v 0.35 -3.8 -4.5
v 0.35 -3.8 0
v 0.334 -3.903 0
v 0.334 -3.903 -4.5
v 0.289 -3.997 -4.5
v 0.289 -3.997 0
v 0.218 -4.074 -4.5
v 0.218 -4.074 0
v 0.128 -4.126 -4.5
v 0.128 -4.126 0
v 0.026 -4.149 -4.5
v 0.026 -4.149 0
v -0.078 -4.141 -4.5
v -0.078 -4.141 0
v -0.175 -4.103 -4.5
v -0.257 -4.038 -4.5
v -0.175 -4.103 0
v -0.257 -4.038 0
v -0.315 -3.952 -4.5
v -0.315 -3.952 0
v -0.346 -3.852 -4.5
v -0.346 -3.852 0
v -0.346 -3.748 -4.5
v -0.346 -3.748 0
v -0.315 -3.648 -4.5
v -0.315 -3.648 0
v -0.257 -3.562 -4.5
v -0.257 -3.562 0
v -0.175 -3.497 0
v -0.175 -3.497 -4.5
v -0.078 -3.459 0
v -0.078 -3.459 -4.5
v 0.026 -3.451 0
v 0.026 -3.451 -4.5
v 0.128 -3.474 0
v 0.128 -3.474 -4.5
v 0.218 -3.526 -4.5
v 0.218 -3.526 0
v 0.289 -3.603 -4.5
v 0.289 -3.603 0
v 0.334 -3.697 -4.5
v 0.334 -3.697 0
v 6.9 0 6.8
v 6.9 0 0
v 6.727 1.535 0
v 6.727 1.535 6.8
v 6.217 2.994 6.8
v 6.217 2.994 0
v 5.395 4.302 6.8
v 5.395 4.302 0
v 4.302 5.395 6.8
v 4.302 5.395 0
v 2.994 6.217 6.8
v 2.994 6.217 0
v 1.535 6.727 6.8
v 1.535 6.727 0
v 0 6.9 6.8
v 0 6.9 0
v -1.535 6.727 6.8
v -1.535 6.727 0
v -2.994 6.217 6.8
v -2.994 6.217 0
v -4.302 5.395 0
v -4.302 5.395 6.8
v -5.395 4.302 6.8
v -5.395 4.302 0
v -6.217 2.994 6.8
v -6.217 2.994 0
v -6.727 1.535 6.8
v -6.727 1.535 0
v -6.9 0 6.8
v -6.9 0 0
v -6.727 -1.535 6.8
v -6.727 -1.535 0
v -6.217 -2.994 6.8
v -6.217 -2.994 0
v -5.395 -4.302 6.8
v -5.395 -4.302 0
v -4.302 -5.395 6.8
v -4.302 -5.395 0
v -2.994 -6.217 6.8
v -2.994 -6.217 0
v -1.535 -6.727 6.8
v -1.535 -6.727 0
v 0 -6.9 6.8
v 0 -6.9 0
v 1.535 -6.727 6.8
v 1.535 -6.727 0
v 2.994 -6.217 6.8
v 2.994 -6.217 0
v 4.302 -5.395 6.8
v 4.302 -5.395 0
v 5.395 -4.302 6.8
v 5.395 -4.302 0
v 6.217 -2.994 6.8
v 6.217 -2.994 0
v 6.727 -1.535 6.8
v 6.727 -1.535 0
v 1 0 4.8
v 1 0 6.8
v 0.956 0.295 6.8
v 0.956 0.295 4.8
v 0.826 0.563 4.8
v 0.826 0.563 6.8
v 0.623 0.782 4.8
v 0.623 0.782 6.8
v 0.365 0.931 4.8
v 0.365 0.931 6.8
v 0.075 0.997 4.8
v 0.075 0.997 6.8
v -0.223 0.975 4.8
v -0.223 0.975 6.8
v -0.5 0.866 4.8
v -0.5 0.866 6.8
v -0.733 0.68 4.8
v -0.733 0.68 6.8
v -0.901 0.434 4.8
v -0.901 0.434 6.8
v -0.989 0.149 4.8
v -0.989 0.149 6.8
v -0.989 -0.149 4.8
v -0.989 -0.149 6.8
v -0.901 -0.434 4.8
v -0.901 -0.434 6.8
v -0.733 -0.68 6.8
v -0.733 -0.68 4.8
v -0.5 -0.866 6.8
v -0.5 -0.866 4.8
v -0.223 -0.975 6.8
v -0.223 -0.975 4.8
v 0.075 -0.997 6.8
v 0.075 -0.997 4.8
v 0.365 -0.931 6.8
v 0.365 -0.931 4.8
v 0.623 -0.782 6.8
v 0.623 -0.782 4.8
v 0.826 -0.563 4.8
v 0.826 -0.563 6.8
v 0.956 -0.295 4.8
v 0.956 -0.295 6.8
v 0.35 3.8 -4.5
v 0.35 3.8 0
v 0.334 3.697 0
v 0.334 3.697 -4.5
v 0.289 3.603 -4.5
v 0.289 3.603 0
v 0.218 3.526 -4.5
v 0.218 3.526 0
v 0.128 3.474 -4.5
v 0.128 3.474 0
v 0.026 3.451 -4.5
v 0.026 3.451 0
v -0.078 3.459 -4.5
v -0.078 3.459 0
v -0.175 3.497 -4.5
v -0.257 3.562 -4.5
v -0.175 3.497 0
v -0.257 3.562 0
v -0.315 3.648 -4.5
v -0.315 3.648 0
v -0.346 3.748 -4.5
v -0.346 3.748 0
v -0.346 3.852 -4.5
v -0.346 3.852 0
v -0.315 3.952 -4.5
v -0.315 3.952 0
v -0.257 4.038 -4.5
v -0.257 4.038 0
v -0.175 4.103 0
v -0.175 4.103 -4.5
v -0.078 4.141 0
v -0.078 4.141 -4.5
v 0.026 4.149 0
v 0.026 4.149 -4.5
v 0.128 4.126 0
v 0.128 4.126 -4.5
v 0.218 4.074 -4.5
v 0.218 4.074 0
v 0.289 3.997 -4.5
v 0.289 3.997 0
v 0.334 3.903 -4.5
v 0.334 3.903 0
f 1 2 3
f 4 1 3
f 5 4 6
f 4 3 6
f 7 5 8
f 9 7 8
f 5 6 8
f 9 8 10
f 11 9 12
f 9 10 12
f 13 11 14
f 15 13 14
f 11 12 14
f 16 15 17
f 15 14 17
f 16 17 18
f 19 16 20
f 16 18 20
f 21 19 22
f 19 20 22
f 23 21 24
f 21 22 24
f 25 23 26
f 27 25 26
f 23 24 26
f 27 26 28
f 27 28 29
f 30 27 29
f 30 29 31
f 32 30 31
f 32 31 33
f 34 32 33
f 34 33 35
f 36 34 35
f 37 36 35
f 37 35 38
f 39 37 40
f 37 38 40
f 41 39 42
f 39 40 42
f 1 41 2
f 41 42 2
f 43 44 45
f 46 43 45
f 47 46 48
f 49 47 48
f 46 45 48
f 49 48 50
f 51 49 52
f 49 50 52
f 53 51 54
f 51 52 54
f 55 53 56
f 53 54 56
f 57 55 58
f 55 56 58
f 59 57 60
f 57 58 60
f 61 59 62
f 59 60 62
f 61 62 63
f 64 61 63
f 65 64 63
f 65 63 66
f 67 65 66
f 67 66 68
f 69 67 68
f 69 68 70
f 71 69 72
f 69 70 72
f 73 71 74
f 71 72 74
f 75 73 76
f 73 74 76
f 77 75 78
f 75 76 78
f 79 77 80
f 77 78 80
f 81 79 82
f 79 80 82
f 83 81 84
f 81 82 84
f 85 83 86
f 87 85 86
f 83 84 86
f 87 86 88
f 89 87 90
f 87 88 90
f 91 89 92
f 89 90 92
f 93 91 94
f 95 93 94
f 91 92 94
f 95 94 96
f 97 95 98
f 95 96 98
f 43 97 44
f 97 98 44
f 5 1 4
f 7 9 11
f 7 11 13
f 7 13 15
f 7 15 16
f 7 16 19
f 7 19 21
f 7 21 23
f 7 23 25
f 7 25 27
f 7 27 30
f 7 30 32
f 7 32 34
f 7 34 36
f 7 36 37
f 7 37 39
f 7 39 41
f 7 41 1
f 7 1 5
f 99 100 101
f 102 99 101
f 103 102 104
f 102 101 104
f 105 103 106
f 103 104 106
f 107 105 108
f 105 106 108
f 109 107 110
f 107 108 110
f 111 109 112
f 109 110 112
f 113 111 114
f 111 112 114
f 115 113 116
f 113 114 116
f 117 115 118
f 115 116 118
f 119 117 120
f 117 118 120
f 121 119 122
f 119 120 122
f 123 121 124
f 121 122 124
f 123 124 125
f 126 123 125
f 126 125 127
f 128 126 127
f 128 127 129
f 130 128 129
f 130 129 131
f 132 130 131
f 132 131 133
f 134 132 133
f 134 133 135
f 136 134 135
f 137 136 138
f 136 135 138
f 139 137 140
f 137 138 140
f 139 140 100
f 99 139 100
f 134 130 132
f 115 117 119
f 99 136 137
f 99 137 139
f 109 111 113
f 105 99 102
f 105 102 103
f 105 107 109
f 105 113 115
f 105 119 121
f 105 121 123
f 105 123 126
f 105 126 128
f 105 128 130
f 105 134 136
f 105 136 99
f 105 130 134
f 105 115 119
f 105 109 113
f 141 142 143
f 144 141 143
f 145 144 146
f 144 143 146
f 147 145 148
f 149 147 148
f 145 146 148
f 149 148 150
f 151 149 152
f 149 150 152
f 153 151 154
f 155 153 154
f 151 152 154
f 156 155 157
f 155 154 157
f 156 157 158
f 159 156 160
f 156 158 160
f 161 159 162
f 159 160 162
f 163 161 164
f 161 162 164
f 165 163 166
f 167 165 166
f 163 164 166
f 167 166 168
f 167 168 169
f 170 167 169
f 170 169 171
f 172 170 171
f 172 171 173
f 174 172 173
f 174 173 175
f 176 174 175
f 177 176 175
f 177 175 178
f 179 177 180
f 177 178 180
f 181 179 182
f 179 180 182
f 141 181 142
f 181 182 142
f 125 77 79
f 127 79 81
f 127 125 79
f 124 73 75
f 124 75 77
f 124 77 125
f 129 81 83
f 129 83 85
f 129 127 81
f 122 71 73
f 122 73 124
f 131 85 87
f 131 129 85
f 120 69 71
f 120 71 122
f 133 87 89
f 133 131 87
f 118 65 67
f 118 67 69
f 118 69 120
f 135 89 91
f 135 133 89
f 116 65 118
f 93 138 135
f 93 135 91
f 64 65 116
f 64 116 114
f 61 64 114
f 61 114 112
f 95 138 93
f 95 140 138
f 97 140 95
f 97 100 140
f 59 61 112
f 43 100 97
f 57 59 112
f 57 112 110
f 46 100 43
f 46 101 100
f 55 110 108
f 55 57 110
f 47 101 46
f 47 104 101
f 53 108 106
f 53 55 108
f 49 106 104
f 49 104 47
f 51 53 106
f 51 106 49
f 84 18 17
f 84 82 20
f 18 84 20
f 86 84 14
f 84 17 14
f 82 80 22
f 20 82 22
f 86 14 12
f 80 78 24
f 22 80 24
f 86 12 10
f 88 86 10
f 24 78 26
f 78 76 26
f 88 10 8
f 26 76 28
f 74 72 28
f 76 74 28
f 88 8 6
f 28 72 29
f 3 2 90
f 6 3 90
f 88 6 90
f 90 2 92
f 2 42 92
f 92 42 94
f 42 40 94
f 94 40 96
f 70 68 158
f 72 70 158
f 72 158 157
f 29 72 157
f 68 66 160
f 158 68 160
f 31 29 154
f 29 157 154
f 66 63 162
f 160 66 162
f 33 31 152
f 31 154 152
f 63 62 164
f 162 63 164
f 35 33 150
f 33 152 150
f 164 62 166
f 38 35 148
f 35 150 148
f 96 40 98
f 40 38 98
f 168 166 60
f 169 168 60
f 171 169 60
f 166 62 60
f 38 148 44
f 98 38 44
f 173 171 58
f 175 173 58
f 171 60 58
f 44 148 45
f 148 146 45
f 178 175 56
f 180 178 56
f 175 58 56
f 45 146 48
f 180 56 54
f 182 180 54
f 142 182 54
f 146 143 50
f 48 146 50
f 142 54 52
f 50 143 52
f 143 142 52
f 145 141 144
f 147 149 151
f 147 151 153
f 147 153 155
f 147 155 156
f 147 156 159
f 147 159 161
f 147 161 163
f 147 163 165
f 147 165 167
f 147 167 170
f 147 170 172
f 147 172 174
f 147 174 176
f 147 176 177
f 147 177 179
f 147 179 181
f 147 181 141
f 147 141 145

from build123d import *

# Parameters (mm, degrees)
SKETCH1_R           = 6.9
BOSS_EXTRUDE1_DEPTH = 6.8
SKETCH2_R           = 1
CUT_EXTRUDE1_DEPTH  = 2
SKETCH3_R           = 0.35
BOSS_EXTRUDE2_DEPTH = 4.5


with BuildPart() as part:
    # Sketch1 → Boss-Extrude1 (new body)
    with BuildSketch(Plane.XY):
        Circle(SKETCH1_R)
    extrude(amount=BOSS_EXTRUDE1_DEPTH)

    # Sketch2 → Cut-Extrude1 (cut)
    with BuildSketch(Plane.XY.offset(6.8)):
        Circle(SKETCH2_R)
    extrude(amount=-CUT_EXTRUDE1_DEPTH, mode=Mode.SUBTRACT)

    # Sketch3 → Boss-Extrude2 (add)
    with BuildSketch(Plane(origin=(0, 0, 0), x_dir=(-1, 0, 0), z_dir=(0, 0, -1))):
        with Locations(Location((0, 3.8, 0), (0, 0, 180))):
            Circle(SKETCH3_R)
        with Locations(Location((0, -3.8, 0), (0, 0, 180))):
            Circle(SKETCH3_R)
    extrude(amount=BOSS_EXTRUDE2_DEPTH)


solid = part.part
